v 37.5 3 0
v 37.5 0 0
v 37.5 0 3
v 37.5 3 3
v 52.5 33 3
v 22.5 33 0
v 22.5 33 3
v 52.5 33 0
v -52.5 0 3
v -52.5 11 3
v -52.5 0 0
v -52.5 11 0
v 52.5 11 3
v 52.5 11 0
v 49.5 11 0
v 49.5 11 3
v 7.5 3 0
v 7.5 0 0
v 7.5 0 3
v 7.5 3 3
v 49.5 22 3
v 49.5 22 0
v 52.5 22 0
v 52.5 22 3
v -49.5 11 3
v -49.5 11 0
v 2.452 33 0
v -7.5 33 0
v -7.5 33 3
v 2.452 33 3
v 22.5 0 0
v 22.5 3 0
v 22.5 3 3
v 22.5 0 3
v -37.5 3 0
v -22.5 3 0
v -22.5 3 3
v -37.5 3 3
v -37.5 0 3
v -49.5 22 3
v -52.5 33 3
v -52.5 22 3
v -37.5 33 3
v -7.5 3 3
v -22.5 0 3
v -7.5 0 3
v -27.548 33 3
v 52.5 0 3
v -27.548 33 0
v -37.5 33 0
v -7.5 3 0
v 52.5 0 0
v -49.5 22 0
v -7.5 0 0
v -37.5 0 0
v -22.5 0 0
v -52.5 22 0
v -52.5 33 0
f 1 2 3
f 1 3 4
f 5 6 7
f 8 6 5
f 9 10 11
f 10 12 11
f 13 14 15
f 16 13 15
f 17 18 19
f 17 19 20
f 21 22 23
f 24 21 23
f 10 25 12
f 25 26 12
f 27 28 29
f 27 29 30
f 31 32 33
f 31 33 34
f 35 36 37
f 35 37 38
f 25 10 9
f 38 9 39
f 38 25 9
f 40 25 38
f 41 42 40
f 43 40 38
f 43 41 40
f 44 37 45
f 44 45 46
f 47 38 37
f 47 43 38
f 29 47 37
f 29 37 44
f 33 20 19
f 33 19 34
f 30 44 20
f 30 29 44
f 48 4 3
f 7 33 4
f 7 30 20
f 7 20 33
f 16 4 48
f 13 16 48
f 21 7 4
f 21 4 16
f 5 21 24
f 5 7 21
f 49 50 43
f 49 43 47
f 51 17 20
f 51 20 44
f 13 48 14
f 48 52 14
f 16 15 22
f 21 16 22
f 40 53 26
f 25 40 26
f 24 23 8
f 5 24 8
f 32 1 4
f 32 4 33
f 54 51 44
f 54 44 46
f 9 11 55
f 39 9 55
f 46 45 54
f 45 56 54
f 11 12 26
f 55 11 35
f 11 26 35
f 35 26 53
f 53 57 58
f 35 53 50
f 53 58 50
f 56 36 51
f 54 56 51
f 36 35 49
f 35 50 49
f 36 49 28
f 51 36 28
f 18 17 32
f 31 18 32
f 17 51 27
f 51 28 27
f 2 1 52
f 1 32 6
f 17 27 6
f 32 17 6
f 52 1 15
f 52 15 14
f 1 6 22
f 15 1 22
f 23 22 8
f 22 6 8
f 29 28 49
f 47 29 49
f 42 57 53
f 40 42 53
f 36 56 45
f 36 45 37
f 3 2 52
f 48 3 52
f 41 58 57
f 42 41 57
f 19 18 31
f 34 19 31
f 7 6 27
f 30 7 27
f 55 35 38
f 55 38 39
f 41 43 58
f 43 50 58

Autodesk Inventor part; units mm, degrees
ref_plane "YZ Plane" through (0, 0, 0) normal (1, 0, 0) x (0, 1, 0)
ref_plane "XZ Plane" through (0, 0, 0) normal (0, 1, 0) x (-1, 0, 0)
ref_plane "XY Plane" through (0, 0, 0) normal (0, 0, 1) x (1, 0, 0)
sketch "Sketch1" plane through (0, 0, 0) normal (0, 0, 1) x (1, 0, 0)
  line L0 (-22.5, 0) -> (-22.5, 3)
  line L1 (-22.5, 3) -> (-37.5, 3)
  line L2 (-37.5, 3) -> (-37.5, 0)
  line L3 (7.5, 0) -> (7.5, 3)
  line L4 (7.5, 3) -> (-7.5, 3)
  line L5 (-7.5, 3) -> (-7.5, 0)
  line L6 (37.5, 0) -> (37.5, 3)
  line L7 (37.5, 3) -> (22.5, 3)
  line L8 (22.5, 3) -> (22.5, 0)
  line L9 (-52.5, 22) -> (-49.5, 22)
  line L10 (-49.5, 22) -> (-49.5, 11)
  line L11 (-49.5, 11) -> (-52.5, 11)
  line L12 (52.5, 11) -> (49.5, 11)
  line L13 (49.5, 11) -> (49.5, 22)
  line L14 (49.5, 22) -> (52.5, 22)
  line L15 (-37.5, 33) -> (-52.5, 33)
  line L16 (52.5, 33) -> (56.4286, 33)
  line L17 (22.5, 33) -> (2.4524, 33)
  line L18 (-7.5, 33) -> (-27.5476, 33)
  line L19 (52.5, 0) -> (52.5, 11)
  line L20 (52.5, 22) -> (52.5, 33)
  line L21 (37.5, 0) -> (52.5, 0)
  line L22 (7.5, 0) -> (22.5, 0)
  line L23 (-52.5, 0) -> (-37.5, 0)
  line L24 (-22.5, 0) -> (-7.5, 0)
  line L25 (-52.5, 33) -> (-52.5, 22)
  line L26 (-52.5, 11) -> (-52.5, 0)
  line L27 (-37.5, 33) -> (57.8569, 33)
  point P0 (0, 0)
  point P1 (0, 30)
  dimension "d46" = 105
  dimension "d48" = 33
  dimension "d49" = 52.5
  dimension "d50" = 0
  dimension "d53" = 0
  dimension "d58" = 11
  dimension "d59" = 11
  dimension "d61" = 15
  dimension "d62" = 7.5
  dimension "d63" = 3
  dimension "d64" = 3
  dimension "d65" = 3
extrude "Extrusion1" add sketch "Sketch1" along normal blind 3
equation "\"d46\" = shelfWs"
equation "\"d48\" = shelfD"
equation "\"d49\" = 0.5 * shelfWs"
equation "\"d58\" = 0.333333 * shelfD - tol"
equation "\"d59\" = 0.333333 * shelfD + 2 * tol"
equation "\"d24\" = tt"
equation "\"d0\" = 0.5 * shelfWs"
equation "\"tt\" = 3"
equation "\"tol\" = 0"
equation "\"d2\" = shelfD"
equation "\"d4\" = tt"
equation "\"tiroir\" = 1"
equation "\"nHoles\" = 4"
equation "\"shelfH\" = 35"
equation "\"shelfWs\" = 105"
equation "\"d47\" = 0.5 * shelfWs"
equation "\"shelfD\" = 33"
properties part number "back"
